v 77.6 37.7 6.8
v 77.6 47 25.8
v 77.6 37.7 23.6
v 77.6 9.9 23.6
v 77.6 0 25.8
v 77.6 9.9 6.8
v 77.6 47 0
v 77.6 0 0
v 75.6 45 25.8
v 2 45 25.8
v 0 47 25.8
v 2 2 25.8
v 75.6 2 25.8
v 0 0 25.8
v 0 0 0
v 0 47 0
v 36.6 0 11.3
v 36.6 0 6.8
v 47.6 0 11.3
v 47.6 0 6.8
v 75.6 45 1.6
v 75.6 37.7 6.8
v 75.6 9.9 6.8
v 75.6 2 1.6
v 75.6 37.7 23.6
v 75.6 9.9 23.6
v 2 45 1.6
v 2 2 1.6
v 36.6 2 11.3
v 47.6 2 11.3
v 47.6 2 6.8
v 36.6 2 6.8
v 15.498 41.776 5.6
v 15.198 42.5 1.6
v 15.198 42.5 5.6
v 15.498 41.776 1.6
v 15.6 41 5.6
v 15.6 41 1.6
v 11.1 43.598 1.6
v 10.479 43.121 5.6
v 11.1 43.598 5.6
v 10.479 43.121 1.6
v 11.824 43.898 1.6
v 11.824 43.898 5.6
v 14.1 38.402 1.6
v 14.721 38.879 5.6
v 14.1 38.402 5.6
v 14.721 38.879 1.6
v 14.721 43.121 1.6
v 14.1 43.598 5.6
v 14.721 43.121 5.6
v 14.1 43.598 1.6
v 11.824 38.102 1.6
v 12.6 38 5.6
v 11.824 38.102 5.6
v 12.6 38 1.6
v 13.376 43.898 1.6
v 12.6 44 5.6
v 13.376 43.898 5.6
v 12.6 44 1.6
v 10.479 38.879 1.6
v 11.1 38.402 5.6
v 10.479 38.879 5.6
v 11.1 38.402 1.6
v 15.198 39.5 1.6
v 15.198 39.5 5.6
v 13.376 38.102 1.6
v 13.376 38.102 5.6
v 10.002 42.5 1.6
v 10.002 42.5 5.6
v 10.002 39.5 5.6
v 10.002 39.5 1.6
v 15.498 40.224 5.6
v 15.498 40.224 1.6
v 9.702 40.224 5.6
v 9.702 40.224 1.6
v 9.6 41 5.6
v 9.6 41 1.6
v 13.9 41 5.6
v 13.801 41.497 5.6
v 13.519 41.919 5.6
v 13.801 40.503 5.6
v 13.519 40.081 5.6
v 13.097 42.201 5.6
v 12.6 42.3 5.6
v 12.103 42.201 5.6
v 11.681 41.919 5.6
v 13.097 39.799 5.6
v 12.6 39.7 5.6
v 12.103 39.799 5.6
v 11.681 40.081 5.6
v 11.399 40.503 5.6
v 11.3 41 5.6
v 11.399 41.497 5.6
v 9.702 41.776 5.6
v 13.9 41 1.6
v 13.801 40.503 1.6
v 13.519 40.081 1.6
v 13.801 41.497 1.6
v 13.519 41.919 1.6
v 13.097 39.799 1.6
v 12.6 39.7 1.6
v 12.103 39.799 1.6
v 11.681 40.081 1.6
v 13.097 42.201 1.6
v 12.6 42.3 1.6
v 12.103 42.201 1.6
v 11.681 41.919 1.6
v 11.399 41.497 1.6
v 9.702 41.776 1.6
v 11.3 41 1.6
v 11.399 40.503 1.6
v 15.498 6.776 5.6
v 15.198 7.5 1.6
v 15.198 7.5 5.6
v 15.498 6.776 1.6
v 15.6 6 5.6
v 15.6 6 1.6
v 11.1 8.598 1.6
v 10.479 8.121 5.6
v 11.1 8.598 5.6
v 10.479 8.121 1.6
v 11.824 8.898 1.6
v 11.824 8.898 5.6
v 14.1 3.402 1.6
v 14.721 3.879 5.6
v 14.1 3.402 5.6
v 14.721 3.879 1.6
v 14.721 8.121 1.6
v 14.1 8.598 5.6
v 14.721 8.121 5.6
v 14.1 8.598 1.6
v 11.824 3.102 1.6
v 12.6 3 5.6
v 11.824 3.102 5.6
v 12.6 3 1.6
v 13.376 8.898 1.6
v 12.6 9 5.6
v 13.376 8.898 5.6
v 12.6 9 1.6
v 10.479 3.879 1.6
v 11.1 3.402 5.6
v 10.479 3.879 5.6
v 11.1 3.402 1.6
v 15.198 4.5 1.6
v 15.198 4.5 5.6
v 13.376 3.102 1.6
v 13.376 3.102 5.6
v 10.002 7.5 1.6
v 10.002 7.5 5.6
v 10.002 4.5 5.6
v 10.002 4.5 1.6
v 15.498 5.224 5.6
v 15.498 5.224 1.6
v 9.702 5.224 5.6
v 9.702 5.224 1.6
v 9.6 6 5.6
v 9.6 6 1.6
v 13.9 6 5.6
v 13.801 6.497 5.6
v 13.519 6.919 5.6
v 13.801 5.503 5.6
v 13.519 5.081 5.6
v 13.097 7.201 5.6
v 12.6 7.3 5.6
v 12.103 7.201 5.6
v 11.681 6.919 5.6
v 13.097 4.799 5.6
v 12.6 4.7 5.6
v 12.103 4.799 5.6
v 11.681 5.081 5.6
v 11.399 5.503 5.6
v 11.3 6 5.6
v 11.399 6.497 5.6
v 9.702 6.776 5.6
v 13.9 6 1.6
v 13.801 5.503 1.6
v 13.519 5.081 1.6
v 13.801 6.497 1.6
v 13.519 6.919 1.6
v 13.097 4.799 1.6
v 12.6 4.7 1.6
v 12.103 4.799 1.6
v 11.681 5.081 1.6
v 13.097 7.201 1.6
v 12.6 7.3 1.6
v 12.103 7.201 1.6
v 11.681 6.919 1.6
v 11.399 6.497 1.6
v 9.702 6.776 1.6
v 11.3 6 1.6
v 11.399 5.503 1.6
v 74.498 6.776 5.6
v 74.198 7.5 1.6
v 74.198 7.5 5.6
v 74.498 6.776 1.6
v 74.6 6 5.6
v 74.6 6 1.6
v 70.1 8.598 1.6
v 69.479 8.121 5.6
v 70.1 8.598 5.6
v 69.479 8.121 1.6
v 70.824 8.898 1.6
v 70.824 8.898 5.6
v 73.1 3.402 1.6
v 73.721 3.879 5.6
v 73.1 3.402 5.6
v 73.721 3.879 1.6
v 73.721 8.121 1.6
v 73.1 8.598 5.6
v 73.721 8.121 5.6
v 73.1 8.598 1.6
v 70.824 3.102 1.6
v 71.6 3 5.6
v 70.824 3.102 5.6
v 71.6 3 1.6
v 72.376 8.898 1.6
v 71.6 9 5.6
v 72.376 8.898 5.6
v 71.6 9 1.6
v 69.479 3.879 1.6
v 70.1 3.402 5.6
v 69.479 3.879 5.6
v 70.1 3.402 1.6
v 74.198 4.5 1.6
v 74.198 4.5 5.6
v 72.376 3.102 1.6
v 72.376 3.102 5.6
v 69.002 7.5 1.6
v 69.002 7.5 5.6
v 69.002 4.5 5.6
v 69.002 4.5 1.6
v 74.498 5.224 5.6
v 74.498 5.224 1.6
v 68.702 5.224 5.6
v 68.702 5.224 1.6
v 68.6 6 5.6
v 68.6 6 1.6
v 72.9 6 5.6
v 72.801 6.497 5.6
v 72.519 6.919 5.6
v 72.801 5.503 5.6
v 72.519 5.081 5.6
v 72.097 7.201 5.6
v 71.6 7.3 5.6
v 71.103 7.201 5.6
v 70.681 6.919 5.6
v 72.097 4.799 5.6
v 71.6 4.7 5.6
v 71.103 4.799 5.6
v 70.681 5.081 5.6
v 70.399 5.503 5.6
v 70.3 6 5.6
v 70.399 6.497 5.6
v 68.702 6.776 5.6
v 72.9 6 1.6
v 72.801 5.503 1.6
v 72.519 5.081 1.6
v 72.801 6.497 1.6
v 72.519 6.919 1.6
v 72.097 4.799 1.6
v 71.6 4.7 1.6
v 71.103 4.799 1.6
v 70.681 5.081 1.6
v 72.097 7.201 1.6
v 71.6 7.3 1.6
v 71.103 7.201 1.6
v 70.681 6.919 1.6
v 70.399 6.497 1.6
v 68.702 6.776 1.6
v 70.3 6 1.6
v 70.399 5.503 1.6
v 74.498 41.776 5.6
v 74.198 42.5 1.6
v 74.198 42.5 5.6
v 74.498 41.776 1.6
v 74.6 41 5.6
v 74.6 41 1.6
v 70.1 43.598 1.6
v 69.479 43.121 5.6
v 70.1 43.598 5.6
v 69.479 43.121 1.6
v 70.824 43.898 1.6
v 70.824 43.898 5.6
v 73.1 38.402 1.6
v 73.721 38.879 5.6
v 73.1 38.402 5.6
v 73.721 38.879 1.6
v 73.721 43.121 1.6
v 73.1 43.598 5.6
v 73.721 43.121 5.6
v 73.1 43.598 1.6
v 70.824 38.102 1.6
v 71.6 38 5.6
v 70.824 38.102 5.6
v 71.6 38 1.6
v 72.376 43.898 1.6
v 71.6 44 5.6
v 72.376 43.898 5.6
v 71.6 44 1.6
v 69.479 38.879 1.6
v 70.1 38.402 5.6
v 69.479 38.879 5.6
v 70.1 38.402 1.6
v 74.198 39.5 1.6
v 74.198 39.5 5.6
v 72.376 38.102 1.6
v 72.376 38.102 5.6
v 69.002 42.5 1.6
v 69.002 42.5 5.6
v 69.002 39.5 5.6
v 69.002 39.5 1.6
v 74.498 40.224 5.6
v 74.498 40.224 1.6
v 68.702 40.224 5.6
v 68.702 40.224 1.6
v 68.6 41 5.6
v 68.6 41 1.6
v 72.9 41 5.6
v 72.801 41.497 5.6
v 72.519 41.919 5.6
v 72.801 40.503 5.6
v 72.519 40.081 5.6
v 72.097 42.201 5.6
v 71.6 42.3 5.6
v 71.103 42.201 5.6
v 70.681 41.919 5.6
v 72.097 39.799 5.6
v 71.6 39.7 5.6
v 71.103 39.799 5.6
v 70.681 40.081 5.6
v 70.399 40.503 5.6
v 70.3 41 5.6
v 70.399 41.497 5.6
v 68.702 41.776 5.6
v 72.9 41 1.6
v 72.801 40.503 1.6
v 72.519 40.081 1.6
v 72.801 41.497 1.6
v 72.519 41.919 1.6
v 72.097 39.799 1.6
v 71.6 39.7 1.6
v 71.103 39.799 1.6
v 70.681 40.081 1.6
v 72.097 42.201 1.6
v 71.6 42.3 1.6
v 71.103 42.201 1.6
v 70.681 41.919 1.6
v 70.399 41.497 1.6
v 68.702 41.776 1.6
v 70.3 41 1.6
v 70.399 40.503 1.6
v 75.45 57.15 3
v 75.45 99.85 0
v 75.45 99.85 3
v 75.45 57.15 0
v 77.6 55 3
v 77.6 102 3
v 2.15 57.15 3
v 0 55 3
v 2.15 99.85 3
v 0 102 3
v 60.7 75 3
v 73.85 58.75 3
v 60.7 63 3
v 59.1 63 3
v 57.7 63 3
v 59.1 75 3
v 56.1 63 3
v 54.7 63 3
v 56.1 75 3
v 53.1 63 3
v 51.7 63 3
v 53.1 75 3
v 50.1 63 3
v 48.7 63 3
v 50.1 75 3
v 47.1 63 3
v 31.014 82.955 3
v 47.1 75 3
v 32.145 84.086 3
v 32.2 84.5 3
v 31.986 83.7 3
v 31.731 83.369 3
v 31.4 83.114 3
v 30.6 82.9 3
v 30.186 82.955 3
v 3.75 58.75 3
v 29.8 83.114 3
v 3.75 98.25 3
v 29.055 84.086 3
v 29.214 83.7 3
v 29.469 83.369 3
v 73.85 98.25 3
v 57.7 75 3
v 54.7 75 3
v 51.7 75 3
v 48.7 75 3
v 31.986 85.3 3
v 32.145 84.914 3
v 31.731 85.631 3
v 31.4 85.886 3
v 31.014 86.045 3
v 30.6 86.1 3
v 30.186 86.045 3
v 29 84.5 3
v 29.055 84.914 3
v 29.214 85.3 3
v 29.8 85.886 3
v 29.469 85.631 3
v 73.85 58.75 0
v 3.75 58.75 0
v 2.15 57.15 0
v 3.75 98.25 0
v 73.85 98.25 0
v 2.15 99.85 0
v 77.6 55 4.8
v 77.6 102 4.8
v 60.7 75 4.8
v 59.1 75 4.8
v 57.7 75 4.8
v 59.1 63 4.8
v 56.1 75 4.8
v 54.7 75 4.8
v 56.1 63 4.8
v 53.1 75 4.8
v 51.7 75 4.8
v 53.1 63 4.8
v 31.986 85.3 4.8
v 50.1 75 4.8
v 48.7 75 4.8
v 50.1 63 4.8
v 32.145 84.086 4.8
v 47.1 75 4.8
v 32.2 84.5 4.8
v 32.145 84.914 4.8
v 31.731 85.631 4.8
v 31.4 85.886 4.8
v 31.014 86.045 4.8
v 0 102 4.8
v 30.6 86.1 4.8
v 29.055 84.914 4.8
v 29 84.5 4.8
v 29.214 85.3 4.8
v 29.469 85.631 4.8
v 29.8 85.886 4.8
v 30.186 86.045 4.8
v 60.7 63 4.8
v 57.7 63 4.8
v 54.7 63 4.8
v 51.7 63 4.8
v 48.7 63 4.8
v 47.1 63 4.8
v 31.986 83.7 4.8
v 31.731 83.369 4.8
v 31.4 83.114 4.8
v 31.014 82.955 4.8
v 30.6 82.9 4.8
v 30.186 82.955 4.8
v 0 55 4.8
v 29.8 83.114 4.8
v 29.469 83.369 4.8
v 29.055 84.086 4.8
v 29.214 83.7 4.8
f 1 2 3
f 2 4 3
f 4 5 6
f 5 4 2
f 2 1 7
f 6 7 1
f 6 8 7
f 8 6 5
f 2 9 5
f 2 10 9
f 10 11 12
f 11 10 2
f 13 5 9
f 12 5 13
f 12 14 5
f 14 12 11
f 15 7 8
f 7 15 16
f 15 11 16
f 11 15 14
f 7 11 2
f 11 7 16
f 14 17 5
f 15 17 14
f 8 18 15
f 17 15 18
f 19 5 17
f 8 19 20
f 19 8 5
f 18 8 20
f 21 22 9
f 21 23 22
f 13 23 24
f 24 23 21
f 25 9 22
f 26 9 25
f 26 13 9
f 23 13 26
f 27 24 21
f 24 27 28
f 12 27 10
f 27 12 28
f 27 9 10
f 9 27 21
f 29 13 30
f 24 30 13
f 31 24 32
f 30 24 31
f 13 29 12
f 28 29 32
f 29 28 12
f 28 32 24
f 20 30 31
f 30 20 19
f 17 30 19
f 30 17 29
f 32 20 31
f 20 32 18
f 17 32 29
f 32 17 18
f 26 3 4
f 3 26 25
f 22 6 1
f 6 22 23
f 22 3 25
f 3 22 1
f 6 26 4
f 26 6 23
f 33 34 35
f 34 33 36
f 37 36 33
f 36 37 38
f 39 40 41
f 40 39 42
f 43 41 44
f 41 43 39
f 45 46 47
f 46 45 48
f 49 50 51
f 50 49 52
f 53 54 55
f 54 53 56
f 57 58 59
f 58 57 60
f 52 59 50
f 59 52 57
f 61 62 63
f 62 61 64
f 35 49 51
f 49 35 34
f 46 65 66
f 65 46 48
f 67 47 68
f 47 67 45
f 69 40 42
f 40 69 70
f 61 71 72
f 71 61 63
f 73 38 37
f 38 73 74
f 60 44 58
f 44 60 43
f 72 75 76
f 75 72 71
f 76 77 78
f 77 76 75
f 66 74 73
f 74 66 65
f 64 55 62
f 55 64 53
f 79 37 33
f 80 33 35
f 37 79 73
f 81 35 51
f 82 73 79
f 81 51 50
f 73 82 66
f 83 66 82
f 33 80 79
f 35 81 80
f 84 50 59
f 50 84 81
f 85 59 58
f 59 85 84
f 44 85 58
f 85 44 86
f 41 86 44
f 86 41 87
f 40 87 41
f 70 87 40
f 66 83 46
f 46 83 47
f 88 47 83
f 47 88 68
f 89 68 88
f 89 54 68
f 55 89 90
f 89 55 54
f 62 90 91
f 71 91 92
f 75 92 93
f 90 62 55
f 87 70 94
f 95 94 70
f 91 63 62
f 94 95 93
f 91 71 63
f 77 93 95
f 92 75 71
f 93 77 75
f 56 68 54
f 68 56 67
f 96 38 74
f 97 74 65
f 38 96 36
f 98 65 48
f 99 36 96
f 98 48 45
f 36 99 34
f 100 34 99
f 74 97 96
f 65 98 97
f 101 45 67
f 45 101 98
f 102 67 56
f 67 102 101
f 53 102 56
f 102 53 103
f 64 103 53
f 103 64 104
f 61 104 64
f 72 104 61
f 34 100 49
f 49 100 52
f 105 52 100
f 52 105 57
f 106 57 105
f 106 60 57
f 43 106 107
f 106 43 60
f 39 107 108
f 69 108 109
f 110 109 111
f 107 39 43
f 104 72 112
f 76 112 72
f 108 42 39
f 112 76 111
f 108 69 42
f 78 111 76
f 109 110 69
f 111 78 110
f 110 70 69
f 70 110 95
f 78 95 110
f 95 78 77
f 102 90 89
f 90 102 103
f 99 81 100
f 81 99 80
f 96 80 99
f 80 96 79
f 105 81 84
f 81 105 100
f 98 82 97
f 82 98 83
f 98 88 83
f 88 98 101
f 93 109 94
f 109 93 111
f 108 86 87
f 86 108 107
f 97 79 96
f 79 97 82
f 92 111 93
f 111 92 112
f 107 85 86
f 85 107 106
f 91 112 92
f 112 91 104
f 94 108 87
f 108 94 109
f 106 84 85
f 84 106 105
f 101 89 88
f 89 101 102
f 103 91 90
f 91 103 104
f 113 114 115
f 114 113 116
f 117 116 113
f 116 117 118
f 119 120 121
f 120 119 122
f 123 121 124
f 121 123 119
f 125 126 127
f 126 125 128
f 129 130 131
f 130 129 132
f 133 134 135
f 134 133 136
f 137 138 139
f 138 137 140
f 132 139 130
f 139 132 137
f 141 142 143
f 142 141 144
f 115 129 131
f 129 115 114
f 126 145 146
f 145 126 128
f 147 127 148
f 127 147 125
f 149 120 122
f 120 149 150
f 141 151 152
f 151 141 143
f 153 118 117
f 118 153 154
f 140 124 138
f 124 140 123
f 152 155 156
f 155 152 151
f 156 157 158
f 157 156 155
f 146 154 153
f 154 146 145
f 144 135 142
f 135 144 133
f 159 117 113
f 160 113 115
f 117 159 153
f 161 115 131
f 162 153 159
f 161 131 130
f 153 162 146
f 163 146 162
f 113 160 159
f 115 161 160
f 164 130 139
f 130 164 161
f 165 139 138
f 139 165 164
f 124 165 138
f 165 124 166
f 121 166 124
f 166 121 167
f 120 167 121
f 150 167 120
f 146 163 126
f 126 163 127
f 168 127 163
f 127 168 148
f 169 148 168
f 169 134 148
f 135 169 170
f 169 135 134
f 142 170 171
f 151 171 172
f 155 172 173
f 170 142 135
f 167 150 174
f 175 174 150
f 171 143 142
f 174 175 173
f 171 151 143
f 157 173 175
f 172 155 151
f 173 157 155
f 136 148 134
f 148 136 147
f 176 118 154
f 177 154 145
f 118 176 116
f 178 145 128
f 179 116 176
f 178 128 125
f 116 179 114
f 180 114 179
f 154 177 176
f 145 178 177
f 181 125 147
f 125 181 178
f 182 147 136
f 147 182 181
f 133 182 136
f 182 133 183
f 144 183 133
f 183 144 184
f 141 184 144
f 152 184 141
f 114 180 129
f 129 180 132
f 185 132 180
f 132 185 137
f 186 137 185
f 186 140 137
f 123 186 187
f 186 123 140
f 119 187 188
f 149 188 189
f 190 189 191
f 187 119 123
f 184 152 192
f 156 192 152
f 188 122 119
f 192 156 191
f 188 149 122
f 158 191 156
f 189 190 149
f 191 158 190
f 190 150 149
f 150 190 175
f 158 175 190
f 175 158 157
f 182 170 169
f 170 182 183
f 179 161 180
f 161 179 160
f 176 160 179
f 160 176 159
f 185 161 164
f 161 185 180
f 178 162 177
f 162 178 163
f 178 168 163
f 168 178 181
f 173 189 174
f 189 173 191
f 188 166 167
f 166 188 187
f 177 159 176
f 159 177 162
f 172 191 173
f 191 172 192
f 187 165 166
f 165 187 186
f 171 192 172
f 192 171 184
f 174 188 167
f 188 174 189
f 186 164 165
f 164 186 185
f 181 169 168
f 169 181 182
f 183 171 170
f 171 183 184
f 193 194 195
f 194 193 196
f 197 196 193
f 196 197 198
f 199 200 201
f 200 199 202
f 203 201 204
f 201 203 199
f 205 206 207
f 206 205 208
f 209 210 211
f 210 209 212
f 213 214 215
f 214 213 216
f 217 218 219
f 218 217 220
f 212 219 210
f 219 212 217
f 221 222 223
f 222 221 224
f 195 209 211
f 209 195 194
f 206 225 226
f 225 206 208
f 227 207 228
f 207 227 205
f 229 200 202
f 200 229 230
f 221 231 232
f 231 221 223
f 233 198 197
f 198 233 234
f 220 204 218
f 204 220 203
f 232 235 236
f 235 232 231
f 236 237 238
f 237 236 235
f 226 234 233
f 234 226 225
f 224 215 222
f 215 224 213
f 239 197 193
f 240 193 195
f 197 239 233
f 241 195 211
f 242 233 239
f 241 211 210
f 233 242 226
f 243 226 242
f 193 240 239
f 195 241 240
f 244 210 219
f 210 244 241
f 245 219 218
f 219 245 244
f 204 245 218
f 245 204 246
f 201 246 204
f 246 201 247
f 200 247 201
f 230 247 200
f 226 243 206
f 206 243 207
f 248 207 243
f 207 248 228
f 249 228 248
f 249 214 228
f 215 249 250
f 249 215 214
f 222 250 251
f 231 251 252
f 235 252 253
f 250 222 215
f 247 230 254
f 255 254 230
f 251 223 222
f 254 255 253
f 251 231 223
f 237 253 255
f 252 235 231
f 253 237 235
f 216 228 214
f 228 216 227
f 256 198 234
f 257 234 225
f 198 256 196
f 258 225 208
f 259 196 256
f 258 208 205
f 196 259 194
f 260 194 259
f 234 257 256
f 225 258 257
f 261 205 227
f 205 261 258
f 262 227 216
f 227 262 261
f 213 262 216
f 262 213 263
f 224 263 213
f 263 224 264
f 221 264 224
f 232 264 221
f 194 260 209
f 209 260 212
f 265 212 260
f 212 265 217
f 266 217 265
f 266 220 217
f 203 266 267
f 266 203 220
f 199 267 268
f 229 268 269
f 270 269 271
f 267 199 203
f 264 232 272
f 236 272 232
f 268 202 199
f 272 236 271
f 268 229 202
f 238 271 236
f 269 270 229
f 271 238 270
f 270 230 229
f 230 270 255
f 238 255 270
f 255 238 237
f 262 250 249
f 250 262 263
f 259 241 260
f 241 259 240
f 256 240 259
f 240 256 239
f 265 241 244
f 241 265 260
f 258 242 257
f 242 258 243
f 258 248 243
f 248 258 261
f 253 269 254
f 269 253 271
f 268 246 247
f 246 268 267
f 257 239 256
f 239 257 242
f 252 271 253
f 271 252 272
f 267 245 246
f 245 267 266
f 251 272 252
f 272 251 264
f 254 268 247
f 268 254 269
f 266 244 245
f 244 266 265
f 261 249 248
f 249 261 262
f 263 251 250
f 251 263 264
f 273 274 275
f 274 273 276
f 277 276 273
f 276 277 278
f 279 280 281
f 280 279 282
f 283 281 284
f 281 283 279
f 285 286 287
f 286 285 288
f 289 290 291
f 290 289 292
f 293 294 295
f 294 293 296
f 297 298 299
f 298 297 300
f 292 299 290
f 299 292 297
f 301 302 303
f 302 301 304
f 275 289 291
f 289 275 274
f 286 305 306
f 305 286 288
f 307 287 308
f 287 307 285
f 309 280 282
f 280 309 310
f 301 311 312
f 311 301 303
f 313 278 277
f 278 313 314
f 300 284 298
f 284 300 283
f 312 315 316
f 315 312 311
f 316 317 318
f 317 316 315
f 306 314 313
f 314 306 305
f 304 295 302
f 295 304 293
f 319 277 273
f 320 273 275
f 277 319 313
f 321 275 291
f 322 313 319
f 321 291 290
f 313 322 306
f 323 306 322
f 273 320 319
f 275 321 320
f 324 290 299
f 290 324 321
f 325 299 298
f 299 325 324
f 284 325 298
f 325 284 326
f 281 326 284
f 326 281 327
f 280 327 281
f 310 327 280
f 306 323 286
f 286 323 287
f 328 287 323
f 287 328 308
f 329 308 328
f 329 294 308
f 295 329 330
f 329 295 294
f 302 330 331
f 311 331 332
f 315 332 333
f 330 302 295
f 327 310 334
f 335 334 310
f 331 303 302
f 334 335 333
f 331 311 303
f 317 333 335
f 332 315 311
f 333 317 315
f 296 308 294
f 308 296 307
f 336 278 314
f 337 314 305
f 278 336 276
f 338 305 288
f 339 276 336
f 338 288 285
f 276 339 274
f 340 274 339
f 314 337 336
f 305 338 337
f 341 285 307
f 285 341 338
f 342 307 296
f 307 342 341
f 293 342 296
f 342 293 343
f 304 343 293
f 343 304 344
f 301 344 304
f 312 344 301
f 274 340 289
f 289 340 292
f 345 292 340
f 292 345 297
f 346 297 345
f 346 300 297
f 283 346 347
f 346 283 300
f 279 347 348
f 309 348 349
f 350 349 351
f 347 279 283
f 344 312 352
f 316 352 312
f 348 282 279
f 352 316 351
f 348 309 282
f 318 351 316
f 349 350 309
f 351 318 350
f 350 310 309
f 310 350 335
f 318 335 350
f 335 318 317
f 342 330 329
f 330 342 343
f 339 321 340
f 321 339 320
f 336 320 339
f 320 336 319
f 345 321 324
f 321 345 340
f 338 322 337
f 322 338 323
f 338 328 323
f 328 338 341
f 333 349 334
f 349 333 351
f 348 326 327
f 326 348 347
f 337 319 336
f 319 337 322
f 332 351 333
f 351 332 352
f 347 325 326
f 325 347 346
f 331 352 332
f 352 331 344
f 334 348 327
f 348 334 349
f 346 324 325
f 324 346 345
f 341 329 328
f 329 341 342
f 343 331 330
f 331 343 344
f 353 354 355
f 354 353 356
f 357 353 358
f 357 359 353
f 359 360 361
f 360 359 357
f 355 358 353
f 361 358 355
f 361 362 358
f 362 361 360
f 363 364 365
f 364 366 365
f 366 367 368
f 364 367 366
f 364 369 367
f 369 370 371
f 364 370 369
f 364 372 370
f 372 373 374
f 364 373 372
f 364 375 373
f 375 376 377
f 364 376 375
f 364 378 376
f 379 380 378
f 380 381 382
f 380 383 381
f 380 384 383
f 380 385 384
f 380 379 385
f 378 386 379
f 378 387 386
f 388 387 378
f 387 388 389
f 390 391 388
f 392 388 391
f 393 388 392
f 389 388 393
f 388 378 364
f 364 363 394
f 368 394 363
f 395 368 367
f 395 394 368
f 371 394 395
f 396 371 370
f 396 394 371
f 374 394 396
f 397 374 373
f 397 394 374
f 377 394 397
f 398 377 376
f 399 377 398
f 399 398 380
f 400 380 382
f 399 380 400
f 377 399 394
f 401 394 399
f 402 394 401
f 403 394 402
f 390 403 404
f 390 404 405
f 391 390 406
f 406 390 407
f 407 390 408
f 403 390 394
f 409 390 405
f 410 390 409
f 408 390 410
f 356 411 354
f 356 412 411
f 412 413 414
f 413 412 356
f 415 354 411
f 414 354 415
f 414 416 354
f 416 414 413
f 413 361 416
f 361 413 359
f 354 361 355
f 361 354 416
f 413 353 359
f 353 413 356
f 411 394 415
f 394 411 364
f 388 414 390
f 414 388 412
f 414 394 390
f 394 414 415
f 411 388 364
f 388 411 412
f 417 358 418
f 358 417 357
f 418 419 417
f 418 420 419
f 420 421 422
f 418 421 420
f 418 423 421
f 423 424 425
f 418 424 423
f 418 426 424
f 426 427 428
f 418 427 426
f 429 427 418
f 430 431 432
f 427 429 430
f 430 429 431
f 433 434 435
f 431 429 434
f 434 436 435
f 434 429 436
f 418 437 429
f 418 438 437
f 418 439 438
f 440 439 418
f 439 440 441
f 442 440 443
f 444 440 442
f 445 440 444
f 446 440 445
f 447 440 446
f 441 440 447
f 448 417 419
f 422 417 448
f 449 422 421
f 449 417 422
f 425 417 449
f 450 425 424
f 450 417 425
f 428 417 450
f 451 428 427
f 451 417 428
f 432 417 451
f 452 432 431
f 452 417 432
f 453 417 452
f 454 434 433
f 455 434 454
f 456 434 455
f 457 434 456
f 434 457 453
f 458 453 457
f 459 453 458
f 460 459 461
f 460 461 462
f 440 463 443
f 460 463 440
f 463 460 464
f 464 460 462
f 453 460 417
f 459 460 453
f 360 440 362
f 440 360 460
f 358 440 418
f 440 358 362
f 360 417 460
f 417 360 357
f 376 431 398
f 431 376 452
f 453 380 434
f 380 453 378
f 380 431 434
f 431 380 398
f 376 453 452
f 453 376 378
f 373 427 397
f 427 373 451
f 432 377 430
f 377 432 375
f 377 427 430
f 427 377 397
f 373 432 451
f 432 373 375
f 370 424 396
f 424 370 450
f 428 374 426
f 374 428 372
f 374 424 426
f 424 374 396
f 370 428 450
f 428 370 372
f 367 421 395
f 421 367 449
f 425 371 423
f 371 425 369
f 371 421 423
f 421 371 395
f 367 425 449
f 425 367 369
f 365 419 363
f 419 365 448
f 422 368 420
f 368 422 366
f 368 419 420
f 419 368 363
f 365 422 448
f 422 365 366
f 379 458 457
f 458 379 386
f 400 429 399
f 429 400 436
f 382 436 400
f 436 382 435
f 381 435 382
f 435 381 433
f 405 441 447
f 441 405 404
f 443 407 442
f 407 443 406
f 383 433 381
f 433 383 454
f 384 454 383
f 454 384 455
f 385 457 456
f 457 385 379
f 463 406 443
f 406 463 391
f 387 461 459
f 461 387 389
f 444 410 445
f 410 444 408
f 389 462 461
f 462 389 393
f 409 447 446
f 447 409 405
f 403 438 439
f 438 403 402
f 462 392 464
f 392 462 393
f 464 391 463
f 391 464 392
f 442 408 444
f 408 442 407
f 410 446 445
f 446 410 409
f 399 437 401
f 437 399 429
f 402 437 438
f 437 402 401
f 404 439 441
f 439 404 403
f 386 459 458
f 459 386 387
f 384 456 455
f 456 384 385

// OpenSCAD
// WakeLight v1.1 enclosure — two-part snap-lid box for the custom PCB.
// Print: PETG or PLA, 0.2 mm layers, no supports. Lid prints upside-down.
//
// Board: 66 x 42 mm, M3 holes at (3.5,3.5)(3.5,38.5)(62.5,38.5)(62.5,3.5)
// ESP32 antenna overhangs the board's left edge by 6.4 mm (keep plastic
// thin there, no metal). USB-C on the bottom edge. Neutrik NC5FAH XLR on
// the right edge — its nose pokes through a large opening in the right wall.

wall   = 2.0;
floor_t = 1.6;
pcb_w  = 66;     // x
pcb_h  = 42;     // y
pcb_t  = 1.6;
ant_overhang = 6.6;
standoff_h = 4;          // space under board for THT pins
inner_clear_h = 17;      // above board: the XLR body is ~15.9 tall
lid_t = 1.8;

iw = pcb_w + ant_overhang + 1.0;   // inner cavity (extra for antenna)
ih = pcb_h + 1.0;
oh = floor_t + standoff_h + pcb_t + inner_clear_h;

holes = [[3.5,3.5],[3.5,38.5],[62.5,38.5],[62.5,3.5]];
// PCB origin inside cavity: antenna side gets the extra room
pcb_x0 = ant_overhang + 0.5;
pcb_y0 = 0.5;

module box() {
  difference() {
    // shell
    cube([iw + 2*wall, ih + 2*wall, oh + floor_t]);
    // cavity
    translate([wall, wall, floor_t])
      cube([iw, ih, oh + 1]);
    // USB-C cutout: board "bottom" edge (y=42 side) faces the front wall.
    // Connector centre at board x=33 → cavity x = pcb_x0+33, sits on top of
    // the board: z = floor_t+standoff_h+pcb_t .. +3.5
    translate([wall + pcb_x0 + 33 - 5.5, 0, floor_t + standoff_h + pcb_t - 0.4])
      cube([11, wall + 2, 4.5]);
    // XLR opening: right wall. NC5FAH body spans board y 7.8..34.1 and is
    // ~15.9 mm tall above the PCB; the latch nose protrudes 2.7 mm past the
    // board edge, i.e. into/through this wall.
    translate([wall + iw - 1, wall + pcb_y0 + (pcb_h - 34.6), floor_t + standoff_h + pcb_t - 0.4])
      cube([wall + 2, 27.8, 16.8]);
    // status LED light pipe hole (board 21.5, 15 → top handled by lid)
  }
  // PCB standoffs with M3 pilot holes
  for (h = holes)
    translate([wall + pcb_x0 + h[0], wall + pcb_y0 + (pcb_h - h[1]), floor_t])
      difference() {
        cylinder(d = 6, h = standoff_h, $fn = 24);
        cylinder(d = 2.6, h = standoff_h + 1, $fn = 16);
      }
}

module lid() {
  difference() {
    union() {
      cube([iw + 2*wall, ih + 2*wall, lid_t]);
      // friction lip
      translate([wall + 0.15, wall + 0.15, -3])
        difference() {
          cube([iw - 0.3, ih - 0.3, 3]);
          translate([1.6, 1.6, -1]) cube([iw - 3.5, ih - 3.5, 5]);
        }
    }
    // vent slots over the regulator area + LED hole
    for (i = [0:4])
      translate([wall + pcb_x0 + 38 + i*3, wall + 6, -1]) cube([1.6, 12, lid_t + 2]);
    translate([wall + pcb_x0 + 21.5, wall + pcb_y0 + (pcb_h - 15), -1])
      cylinder(d = 3.2, h = lid_t + 2, $fn = 24);   // blue LED shows through
  }
}

box();
translate([0, ih + 2*wall + 8, 3]) lid();
